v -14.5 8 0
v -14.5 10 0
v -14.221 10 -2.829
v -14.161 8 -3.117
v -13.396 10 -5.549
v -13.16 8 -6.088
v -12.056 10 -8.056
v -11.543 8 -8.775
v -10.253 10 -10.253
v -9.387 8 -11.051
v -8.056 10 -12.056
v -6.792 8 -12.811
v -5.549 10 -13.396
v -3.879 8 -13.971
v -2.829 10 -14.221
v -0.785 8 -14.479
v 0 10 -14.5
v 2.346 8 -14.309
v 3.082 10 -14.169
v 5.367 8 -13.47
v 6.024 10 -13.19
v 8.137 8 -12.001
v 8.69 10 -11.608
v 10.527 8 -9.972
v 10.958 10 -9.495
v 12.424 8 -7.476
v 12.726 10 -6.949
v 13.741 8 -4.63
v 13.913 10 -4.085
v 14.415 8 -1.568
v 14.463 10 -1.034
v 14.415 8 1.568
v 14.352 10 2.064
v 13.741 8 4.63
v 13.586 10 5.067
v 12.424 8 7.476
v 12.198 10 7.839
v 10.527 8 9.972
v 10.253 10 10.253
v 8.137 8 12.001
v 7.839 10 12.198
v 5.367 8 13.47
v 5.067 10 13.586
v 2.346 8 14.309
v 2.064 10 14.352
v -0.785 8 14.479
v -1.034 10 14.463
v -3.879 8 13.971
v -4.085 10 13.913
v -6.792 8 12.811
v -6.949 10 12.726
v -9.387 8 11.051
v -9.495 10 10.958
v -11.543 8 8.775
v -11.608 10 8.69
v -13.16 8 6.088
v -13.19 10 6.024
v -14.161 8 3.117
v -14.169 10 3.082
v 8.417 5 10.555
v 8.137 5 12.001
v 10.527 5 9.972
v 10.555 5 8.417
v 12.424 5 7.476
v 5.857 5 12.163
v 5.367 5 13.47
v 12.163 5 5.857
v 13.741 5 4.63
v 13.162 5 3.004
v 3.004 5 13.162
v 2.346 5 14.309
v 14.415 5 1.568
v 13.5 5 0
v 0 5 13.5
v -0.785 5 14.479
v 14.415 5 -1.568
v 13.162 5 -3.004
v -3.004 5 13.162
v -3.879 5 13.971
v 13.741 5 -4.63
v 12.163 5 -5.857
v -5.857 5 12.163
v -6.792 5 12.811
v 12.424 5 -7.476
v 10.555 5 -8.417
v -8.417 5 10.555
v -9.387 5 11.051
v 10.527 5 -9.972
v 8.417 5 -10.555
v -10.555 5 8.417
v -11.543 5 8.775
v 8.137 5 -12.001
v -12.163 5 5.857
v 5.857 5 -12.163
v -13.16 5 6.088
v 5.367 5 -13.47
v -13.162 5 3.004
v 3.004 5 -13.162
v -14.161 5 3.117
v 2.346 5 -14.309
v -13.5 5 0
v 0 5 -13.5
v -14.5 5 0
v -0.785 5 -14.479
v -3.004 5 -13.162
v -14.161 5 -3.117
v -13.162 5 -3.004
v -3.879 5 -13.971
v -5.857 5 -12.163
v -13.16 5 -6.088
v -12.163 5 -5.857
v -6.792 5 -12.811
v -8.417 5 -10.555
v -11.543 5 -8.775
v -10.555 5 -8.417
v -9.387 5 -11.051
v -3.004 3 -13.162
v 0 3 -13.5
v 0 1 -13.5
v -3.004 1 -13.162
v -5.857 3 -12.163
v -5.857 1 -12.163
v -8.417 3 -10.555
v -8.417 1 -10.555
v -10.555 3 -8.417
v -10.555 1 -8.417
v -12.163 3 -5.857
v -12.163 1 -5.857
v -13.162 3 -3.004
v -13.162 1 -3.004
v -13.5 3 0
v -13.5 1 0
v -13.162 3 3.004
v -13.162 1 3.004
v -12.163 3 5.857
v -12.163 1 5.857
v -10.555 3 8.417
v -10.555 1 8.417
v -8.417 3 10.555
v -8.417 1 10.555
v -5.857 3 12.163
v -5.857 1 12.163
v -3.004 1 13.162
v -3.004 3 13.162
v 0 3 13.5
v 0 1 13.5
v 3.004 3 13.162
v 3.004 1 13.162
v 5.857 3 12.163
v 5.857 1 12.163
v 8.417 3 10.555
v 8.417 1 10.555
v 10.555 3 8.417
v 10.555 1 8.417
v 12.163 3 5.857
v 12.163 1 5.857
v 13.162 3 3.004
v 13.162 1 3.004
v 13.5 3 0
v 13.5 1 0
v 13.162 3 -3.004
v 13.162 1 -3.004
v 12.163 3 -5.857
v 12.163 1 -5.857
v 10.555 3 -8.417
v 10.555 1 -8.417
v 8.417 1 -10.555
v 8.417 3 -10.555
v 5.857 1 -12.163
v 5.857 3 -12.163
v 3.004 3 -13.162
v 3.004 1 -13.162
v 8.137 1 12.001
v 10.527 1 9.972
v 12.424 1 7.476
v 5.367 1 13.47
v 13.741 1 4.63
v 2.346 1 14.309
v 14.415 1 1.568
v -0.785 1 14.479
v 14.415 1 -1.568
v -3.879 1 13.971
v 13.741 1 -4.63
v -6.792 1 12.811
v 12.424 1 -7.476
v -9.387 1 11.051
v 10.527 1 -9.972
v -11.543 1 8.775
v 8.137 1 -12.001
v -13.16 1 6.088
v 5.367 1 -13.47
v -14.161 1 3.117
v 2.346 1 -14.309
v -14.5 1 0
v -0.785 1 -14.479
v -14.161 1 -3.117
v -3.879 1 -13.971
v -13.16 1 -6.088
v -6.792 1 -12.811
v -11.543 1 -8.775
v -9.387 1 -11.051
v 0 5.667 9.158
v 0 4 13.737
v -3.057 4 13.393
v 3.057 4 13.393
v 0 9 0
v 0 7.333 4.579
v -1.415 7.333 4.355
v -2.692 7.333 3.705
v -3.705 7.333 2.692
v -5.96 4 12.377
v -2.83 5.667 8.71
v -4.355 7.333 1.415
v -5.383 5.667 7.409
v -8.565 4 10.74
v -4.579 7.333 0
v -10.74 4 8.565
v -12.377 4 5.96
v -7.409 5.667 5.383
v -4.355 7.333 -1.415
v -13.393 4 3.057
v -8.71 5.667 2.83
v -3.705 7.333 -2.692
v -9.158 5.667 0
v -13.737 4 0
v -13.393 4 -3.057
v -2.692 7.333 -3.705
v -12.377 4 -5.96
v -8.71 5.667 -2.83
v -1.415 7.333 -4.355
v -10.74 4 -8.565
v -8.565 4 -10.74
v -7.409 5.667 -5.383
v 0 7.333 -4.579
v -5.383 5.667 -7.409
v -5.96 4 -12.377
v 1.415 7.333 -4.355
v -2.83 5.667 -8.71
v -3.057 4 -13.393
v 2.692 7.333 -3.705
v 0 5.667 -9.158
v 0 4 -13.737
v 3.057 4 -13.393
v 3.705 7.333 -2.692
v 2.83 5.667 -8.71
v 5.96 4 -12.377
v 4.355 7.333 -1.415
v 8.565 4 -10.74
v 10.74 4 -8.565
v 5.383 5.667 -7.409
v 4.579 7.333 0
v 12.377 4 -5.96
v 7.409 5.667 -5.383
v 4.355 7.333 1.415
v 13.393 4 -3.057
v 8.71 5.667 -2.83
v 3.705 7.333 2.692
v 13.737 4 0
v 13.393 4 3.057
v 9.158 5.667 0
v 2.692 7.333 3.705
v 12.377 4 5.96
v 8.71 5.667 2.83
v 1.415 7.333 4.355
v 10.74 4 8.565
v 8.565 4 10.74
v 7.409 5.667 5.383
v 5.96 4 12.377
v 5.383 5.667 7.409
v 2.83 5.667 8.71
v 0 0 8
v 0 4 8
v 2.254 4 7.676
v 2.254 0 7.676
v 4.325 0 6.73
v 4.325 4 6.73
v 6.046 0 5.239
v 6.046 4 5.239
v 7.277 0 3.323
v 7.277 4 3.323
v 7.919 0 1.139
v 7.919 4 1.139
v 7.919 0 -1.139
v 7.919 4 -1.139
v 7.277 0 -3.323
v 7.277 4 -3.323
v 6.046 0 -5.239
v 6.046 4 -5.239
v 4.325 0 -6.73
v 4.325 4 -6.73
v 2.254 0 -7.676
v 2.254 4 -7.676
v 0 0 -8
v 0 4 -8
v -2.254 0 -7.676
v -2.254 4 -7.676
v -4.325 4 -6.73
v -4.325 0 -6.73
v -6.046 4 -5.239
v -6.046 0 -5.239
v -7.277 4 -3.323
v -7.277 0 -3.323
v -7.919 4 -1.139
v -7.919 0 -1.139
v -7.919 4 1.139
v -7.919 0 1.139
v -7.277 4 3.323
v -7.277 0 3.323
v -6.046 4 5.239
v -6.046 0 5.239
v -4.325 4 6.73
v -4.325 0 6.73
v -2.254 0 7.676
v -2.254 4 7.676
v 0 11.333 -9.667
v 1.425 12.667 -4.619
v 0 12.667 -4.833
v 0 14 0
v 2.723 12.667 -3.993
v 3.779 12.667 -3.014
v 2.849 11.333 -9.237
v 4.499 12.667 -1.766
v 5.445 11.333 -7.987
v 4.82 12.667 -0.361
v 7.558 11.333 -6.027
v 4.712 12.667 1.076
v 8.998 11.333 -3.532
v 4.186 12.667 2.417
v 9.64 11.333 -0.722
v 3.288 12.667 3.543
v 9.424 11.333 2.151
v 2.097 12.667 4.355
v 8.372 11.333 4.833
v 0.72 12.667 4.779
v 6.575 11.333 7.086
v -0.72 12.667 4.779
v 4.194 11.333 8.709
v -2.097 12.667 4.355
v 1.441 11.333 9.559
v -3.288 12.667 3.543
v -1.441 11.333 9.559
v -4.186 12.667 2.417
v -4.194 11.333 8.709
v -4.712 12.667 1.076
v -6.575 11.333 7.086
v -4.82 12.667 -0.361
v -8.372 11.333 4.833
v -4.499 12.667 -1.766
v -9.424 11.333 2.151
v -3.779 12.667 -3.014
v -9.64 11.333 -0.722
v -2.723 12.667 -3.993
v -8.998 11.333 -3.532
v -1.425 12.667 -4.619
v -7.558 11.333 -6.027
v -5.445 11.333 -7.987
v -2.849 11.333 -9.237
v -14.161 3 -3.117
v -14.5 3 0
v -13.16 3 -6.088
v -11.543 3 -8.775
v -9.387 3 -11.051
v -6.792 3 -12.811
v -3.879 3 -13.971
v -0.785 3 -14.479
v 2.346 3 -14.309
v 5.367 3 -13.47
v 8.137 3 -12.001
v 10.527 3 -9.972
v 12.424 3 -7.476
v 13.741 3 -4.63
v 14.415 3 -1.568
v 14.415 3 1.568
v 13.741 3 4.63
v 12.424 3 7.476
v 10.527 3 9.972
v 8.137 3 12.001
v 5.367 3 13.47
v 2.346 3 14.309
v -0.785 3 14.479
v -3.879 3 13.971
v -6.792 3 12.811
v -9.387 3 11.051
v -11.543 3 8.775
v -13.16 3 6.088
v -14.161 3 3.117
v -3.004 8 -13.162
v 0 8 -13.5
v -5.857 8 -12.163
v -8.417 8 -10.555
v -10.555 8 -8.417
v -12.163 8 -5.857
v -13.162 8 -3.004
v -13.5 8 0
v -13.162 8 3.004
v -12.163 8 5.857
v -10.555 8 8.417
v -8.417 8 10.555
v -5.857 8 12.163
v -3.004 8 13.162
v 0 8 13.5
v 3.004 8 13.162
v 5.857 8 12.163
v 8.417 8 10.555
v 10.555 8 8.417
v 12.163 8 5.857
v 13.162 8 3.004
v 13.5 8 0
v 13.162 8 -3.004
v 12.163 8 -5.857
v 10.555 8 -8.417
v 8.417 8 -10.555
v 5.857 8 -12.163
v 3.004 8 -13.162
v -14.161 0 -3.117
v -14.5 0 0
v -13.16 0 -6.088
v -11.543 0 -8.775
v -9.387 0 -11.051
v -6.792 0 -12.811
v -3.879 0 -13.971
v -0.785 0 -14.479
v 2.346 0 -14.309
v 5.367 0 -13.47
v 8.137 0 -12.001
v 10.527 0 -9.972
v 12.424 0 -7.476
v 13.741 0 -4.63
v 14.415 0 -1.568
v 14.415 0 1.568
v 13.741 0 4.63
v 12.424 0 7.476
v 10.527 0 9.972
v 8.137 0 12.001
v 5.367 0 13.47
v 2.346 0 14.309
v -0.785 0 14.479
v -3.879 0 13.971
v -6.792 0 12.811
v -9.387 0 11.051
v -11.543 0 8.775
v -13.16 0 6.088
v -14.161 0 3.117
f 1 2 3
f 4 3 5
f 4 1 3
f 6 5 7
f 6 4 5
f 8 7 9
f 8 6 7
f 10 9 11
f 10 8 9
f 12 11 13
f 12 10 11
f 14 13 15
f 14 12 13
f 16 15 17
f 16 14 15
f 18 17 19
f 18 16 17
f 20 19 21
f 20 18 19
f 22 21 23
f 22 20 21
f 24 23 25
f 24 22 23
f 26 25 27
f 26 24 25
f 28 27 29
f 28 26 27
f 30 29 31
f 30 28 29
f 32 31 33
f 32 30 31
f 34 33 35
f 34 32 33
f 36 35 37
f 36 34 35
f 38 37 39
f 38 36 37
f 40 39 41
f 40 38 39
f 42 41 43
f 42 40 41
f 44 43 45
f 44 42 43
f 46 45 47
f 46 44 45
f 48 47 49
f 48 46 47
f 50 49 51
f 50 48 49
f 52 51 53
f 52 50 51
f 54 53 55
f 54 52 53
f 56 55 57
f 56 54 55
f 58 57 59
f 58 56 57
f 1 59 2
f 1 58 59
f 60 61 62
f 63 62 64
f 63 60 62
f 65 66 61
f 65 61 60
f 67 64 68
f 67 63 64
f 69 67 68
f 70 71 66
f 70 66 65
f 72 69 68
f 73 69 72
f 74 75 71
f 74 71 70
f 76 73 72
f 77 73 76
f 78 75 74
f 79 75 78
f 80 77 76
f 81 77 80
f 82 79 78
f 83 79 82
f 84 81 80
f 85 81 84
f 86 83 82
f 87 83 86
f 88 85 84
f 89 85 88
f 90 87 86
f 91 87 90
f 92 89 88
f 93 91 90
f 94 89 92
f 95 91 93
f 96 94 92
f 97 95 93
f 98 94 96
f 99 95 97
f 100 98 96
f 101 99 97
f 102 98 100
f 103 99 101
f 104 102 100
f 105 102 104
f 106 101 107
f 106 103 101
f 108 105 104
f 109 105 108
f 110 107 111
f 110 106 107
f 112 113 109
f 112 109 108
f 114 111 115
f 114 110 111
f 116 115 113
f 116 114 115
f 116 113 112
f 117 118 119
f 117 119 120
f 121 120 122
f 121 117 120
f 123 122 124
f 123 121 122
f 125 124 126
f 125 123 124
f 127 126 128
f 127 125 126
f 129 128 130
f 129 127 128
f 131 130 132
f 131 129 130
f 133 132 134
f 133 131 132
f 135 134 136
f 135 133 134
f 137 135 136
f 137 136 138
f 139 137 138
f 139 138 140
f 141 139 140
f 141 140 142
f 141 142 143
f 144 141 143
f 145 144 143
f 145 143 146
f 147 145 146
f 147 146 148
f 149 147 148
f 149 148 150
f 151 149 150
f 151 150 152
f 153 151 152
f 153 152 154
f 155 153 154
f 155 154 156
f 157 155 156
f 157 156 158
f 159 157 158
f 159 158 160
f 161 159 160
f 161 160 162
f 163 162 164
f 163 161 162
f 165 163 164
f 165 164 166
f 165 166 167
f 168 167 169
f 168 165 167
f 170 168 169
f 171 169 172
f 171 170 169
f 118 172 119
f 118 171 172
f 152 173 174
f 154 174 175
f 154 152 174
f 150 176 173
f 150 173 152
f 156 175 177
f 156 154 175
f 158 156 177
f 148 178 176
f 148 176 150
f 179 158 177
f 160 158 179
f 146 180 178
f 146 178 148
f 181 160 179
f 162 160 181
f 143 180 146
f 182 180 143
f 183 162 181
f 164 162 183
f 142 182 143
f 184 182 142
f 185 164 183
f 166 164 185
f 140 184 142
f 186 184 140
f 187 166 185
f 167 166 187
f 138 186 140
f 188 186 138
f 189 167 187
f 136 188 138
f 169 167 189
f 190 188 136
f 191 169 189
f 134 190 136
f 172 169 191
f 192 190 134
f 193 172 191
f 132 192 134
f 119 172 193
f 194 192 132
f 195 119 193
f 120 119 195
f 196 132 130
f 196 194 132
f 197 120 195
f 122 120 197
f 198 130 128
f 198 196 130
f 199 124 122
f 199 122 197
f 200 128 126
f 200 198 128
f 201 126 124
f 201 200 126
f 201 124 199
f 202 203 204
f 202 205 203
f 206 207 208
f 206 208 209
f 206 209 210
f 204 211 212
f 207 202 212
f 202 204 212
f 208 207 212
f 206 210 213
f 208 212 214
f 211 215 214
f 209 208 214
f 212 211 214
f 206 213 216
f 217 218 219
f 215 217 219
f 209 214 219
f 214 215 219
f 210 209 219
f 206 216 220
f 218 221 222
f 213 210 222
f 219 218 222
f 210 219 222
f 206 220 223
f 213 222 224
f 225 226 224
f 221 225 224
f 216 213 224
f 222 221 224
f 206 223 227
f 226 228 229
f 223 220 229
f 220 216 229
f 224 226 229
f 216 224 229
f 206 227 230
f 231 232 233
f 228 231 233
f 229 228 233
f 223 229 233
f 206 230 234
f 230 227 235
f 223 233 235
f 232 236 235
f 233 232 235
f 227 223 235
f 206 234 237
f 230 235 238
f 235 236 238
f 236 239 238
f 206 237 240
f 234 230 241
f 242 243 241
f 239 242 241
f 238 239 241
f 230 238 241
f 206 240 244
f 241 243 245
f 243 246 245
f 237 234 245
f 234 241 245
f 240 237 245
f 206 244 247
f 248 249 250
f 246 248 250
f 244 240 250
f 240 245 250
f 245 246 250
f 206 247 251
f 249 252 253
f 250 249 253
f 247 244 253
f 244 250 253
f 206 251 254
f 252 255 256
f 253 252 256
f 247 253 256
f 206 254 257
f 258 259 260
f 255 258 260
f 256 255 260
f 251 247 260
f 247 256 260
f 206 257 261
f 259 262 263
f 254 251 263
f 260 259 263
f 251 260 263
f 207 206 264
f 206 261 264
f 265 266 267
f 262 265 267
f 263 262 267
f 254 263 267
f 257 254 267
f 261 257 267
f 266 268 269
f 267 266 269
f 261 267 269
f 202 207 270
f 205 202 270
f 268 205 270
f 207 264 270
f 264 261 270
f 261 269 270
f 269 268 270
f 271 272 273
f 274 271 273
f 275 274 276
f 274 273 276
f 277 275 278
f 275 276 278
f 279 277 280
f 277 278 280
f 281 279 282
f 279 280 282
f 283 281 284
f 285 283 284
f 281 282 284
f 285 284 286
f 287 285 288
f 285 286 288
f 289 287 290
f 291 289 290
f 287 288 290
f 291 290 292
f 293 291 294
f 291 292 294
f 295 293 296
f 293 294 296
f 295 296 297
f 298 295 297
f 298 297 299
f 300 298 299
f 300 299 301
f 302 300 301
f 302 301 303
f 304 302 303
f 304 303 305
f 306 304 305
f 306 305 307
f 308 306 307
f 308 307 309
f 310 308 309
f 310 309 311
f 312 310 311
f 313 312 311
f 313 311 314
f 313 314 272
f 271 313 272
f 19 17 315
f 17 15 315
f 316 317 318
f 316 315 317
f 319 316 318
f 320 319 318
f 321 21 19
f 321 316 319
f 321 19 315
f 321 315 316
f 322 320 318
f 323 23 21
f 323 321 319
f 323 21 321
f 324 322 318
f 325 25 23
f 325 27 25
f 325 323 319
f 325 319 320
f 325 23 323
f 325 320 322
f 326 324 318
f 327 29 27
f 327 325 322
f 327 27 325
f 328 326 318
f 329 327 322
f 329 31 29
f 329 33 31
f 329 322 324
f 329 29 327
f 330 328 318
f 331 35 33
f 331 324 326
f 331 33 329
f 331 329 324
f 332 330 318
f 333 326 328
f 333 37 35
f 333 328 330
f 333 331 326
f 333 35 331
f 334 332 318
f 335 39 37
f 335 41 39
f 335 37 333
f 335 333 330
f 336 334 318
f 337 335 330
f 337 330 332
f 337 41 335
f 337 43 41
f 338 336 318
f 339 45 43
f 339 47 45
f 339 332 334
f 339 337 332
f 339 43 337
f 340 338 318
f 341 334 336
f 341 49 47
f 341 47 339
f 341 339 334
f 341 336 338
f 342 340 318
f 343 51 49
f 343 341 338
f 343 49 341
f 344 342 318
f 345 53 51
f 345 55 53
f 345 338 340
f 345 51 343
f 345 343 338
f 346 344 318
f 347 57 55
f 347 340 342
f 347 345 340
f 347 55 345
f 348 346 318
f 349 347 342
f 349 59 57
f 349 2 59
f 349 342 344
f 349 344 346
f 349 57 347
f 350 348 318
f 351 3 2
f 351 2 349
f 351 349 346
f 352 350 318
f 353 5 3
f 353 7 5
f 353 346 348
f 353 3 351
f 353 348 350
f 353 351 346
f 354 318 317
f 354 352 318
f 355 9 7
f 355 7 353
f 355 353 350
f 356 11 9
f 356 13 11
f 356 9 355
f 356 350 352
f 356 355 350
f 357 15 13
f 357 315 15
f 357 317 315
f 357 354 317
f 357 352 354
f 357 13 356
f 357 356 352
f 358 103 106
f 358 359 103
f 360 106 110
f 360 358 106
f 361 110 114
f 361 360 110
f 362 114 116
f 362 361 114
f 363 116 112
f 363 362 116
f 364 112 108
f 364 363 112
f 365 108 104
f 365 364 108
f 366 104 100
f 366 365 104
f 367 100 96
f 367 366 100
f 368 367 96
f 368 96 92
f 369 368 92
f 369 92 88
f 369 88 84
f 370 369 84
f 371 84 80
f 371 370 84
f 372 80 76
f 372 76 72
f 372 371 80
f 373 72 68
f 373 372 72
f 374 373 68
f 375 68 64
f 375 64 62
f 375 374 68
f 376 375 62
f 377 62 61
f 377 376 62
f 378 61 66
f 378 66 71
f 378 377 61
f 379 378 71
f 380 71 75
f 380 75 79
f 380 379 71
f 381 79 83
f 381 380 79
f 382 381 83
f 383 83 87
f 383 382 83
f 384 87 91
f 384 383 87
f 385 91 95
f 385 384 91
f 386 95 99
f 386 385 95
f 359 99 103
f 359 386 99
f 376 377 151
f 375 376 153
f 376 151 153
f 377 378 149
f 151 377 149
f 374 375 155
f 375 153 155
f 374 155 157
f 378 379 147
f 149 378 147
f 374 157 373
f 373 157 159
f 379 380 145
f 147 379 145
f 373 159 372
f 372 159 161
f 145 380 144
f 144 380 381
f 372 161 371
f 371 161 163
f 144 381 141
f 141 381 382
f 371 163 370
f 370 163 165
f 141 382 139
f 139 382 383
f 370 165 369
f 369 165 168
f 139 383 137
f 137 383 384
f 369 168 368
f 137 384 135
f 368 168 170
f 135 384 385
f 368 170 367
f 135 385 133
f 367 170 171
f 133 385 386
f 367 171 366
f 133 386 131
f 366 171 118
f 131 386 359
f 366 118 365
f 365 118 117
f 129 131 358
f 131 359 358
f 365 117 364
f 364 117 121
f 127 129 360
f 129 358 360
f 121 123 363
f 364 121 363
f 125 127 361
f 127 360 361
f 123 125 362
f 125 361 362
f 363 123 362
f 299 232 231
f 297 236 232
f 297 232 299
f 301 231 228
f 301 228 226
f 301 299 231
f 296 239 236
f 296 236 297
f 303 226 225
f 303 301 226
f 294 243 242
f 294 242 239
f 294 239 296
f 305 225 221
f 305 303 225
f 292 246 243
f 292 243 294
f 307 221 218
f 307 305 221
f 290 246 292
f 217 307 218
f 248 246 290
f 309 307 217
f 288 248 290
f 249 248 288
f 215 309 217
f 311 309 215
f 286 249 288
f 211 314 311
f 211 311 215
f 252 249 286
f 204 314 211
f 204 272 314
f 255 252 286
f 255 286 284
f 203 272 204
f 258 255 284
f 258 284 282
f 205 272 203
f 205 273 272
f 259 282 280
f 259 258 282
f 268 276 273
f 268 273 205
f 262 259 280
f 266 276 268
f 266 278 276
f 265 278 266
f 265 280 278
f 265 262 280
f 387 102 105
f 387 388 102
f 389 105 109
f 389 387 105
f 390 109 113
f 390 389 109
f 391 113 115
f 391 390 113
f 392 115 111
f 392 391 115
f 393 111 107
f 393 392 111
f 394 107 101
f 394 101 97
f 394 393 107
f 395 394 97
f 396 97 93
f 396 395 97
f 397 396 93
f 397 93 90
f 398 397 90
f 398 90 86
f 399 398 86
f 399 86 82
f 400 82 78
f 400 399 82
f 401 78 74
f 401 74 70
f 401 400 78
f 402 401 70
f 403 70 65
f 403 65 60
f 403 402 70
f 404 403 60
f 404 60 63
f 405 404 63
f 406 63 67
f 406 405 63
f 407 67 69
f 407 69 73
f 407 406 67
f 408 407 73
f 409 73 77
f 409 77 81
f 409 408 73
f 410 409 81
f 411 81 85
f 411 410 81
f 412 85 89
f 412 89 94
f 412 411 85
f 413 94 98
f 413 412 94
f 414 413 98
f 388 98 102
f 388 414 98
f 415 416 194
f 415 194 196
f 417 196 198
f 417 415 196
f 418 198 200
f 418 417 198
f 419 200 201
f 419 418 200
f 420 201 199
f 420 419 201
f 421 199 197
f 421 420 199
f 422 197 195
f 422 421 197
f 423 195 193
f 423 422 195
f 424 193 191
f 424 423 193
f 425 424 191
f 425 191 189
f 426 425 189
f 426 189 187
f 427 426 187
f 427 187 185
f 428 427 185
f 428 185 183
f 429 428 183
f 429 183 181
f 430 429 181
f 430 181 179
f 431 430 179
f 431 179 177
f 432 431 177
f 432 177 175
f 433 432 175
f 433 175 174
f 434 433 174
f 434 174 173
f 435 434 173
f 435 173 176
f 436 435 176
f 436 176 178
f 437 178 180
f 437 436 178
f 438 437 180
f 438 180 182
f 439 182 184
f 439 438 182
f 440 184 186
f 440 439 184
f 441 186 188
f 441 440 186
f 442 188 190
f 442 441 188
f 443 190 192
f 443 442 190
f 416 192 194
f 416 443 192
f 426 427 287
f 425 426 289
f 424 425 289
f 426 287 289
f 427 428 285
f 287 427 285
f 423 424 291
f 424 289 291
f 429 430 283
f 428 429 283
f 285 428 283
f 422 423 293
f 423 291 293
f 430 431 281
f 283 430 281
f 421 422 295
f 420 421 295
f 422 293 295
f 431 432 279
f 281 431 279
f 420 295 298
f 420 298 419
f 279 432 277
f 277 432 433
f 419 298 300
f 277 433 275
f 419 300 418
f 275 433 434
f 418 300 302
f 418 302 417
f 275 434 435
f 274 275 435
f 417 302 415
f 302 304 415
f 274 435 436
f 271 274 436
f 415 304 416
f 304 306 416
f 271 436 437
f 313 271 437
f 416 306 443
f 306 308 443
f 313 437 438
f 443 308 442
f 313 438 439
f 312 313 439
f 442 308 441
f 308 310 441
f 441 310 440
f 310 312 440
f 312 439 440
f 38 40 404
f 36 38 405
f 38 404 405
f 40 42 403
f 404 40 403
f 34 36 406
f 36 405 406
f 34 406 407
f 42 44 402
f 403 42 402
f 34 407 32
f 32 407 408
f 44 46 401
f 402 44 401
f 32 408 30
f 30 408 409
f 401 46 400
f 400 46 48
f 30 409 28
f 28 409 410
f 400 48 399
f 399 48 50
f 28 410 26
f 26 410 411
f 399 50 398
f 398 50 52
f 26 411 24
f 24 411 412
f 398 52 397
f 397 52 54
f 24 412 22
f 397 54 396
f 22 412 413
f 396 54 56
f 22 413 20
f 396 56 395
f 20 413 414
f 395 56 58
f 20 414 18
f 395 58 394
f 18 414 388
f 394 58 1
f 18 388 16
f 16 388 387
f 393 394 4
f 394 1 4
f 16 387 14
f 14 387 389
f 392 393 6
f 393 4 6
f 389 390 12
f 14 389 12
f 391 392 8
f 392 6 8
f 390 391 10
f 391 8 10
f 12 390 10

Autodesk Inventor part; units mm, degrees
ref_plane "YZ Plane" through (0, 0, 0) normal (1, 0, 0) x (0, 1, 0)
ref_plane "XZ Plane" through (0, 0, 0) normal (0, 1, 0) x (-1, 0, 0)
ref_plane "XY Plane" through (0, 0, 0) normal (0, 0, 1) x (1, 0, 0)
sketch "Sketch1" plane through (0, 0, 0) normal (0, 1, 0) x (-1, 0, 0)
  circle A0 centre (0, 0) radius 14.5
  dimension "d0" = 29
extrude "Extrusion1" add sketch "Sketch1" along normal blind 14
sketch "Sketch2" plane through (0, 0, 0) normal (1, 0, 0) x (0, 1, 0)
  line L0 (14, -14.5) -> (14, 14.5) projected
  line L1 (14, 0) -> (14, -25)
  line L2 (14, -25) -> (7.1034, -25)
  line L3 (7.1034, -25) -> (14, 0)
  line L4 (5, -14.5) -> (5, -13.5)
  line L5 (5, -13.5) -> (8, -13.5)
  line L6 (8, -13.5) -> (8, -14.5)
  line L7 (8, -14.5) -> (5, -14.5)
  line L8 (1, -13.5) -> (3, -13.5)
  line L9 (3, -13.5) -> (3, -14.5)
  line L10 (3, -14.5) -> (1, -14.5)
  line L11 (1, -14.5) -> (1, -13.5)
  line L12 (0, 14.5) -> (0, -14.5) projected
  line L13 (0, -14.5) -> (14, -14.5) projected
  line L14 (-2.8, 0) -> (16.8, 0) projected
  point P0 (0, 0)
  point P1 (10, -14.5)
  dimension "d3" = 1
  dimension "d4" = 3
  dimension "d5" = 2
  dimension "d6" = 1
  dimension "d7" = 2
  dimension "d8" = 1
  dimension "d9" = 2
  dimension "d10" = 25
revolve "Revolution1" cut sketch "Sketch2" angle 360 about axis through (0, -10, 0) along (0, 1, 0) contours L13 L3 L0 | L1 L2 L3 L13 | L7 L4 L5 L6 | L11 L8 L9 L10
sketch "Sketch3" plane through (0, 0, 0) normal (1, 0, 0) x (0, 1, 0)
  line L0 (0, 0) -> (0, 8)
  line L1 (0, 8) -> (4, 8)
  line L2 (4, 8) -> (4, 13.7374)
  line L3 (4, 13.7374) -> (9, 0)
  line L4 (9, 0) -> (0, 0)
  line L5 (9, 0) -> (9, 10.144) construction
  line L6 (0, 14.5) -> (0, -14.5) construction
  line L7 (-2.8, 0) -> (16.8, 0) construction
  point P0 (0, 0)
  dimension "d12" = 8
  dimension "d13" = 4
  dimension "d14" = 5
  dimension "d15" = 20
  dimension "d19" = 10.144
revolve "Revolution2" cut sketch "Sketch3" angle 360 about axis through (0, -10, 0) along (0, 1, 0)
properties part number "Valvula"
